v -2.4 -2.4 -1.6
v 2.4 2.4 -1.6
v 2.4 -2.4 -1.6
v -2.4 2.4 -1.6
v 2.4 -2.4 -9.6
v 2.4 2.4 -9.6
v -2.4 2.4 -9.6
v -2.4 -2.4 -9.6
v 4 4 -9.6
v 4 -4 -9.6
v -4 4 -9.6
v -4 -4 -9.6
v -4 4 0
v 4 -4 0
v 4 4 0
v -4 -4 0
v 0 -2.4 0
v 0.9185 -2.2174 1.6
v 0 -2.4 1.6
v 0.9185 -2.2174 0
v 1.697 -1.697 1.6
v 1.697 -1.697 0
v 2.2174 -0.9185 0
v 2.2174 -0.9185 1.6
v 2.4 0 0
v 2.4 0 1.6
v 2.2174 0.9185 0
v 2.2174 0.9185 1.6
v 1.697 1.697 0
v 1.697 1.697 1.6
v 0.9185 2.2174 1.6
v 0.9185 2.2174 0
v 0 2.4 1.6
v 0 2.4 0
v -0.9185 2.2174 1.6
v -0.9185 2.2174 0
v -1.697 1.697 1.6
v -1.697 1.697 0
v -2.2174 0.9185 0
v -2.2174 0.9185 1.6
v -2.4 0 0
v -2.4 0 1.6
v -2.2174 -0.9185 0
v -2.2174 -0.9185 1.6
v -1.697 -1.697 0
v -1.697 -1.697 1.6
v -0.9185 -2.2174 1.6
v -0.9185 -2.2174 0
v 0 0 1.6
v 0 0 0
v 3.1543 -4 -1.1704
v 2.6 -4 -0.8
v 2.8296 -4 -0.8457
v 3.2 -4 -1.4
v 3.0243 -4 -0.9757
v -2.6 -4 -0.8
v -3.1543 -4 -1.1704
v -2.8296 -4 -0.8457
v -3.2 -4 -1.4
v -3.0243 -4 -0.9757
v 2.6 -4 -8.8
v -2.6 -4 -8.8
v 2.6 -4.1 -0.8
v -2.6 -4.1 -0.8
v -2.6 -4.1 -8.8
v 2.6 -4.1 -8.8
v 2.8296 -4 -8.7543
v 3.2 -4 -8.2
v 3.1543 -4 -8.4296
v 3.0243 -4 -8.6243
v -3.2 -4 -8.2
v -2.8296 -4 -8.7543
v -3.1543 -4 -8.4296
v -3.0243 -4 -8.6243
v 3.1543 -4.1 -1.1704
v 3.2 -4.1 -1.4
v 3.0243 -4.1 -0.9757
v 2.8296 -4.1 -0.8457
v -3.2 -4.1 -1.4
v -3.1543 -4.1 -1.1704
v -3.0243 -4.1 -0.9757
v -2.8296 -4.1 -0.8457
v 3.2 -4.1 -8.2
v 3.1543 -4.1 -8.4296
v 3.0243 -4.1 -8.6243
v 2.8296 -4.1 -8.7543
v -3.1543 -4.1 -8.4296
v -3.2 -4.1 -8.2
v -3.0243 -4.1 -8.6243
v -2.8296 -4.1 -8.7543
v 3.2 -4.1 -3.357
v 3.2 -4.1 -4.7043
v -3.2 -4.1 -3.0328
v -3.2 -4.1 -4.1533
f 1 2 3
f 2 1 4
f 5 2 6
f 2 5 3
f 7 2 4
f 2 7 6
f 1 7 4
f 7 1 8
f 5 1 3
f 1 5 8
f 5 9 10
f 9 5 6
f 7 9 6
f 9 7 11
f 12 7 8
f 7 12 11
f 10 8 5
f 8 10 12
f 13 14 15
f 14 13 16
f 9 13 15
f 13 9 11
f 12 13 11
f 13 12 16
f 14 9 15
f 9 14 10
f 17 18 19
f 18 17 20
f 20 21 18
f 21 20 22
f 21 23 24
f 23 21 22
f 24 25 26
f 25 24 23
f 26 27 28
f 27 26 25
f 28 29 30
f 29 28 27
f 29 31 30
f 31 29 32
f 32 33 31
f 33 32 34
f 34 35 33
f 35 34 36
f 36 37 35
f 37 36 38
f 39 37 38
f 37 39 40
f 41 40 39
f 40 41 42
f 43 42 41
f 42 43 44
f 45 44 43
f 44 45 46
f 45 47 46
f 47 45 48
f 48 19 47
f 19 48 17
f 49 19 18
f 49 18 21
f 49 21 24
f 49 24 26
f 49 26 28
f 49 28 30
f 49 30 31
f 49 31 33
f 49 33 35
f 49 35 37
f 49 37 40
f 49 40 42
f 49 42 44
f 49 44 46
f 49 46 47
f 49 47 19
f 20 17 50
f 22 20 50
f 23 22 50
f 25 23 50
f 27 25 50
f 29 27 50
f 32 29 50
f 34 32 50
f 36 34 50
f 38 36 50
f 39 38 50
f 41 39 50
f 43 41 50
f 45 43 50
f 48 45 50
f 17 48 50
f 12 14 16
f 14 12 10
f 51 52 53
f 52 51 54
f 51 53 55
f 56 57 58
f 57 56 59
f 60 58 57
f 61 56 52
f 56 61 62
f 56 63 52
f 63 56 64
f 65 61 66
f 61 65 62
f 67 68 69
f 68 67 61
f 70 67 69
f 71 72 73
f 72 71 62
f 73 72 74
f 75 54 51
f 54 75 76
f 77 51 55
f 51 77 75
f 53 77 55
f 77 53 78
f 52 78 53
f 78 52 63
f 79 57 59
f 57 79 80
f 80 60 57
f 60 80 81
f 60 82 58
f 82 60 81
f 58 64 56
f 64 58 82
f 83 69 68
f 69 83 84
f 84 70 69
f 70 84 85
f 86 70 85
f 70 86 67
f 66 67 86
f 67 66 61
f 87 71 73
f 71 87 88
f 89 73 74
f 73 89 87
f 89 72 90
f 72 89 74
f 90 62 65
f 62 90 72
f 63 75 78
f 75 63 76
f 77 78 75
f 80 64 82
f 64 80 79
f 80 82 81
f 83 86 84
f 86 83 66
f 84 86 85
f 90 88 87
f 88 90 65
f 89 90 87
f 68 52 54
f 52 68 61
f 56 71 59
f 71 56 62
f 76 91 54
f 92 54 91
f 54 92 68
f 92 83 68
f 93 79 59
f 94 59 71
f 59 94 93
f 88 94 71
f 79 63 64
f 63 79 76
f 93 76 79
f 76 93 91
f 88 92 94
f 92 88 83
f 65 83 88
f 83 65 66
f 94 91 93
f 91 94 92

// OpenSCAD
// file: ../p/4-4edge.scad
use <../lib.scad>
function ldraw_lib__4_4edge() = [
// 0 Circle 1.0
// 0 Name: 4-4edge.dat
// 0 Author: James Jessiman
// 0 !LDRAW_ORG Primitive UPDATE 2017-01
// 0 !LICENSE Licensed under CC BY 2.0 and CC BY 4.0 : see CAreadme.txt
// 
// 0 BFC CERTIFY CCW
  [0,"BFC","CERTIFY"],
  [0,"BFC","CCW"],
// 
// 0 !HISTORY 1998-12-15 [PTadmin] Official Update 1998-10
// 0 !HISTORY 2005-12-28 [PTadmin] Official Update 2005-01
// 0 !HISTORY 2007-06-24 [PTadmin] Header formatted for Contributor Agreement
// 0 !HISTORY 2008-07-01 [PTadmin] Official Update 2008-01
// 0 !HISTORY 2017-01-15 [Steffen] BFCed
// 0 !HISTORY 2017-12-30 [PTadmin] Official Update 2017-01
// 
// 
// 2 24 1 0 0 0.9239 0 0.3827
  [2,24,1,0,0,0.9239,0,0.3827],
// 2 24 0.9239 0 0.3827 0.7071 0 0.7071
  [2,24,0.9239,0,0.3827,0.7071,0,0.7071],
// 2 24 0.7071 0 0.7071 0.3827 0 0.9239
  [2,24,0.7071,0,0.7071,0.3827,0,0.9239],
// 2 24 0.3827 0 0.9239 0 0 1
  [2,24,0.3827,0,0.9239,0,0,1],
// 2 24 0 0 1 -0.3827 0 0.9239
  [2,24,0,0,1,-0.3827,0,0.9239],
// 2 24 -0.3827 0 0.9239 -0.7071 0 0.7071
  [2,24,-0.3827,0,0.9239,-0.7071,0,0.7071],
// 2 24 -0.7071 0 0.7071 -0.9239 0 0.3827
  [2,24,-0.7071,0,0.7071,-0.9239,0,0.3827],
// 2 24 -0.9239 0 0.3827 -1 0 -0
  [2,24,-0.9239,0,0.3827,-1,0,-0],
// 2 24 -1 0 -0 -0.9239 0 -0.3827
  [2,24,-1,0,-0,-0.9239,0,-0.3827],
// 2 24 -0.9239 0 -0.3827 -0.7071 0 -0.7071
  [2,24,-0.9239,0,-0.3827,-0.7071,0,-0.7071],
// 2 24 -0.7071 0 -0.7071 -0.3827 0 -0.9239
  [2,24,-0.7071,0,-0.7071,-0.3827,0,-0.9239],
// 2 24 -0.3827 0 -0.9239 0 0 -1
  [2,24,-0.3827,0,-0.9239,0,0,-1],
// 2 24 0 0 -1 0.3827 0 -0.9239
  [2,24,0,0,-1,0.3827,0,-0.9239],
// 2 24 0.3827 0 -0.9239 0.7071 0 -0.7071
  [2,24,0.3827,0,-0.9239,0.7071,0,-0.7071],
// 2 24 0.7071 0 -0.7071 0.9239 0 -0.3827
  [2,24,0.7071,0,-0.7071,0.9239,0,-0.3827],
// 2 24 0.9239 0 -0.3827 1 0 0
  [2,24,0.9239,0,-0.3827,1,0,0],
];
module ldraw_lib__4_4edge(step=0, col=false, unit=2/5, alt=false, line=0.2, solid=!$preview)
    makepoly(ldraw_lib__4_4edge(), step=step, col=col, unit=unit, alt=alt, line=line, solid=solid);
ldraw_lib__4_4edge(line=0.2);
// file: ../p/4-4disc.scad
use <../lib.scad>
function ldraw_lib__4_4disc() = [
// 0 Disc 1.0
// 0 Name: 4-4disc.dat
// 0 Author: James Jessiman
// 0 !LDRAW_ORG Primitive UPDATE 2002-02
// 0 !LICENSE Licensed under CC BY 2.0 and CC BY 4.0 : see CAreadme.txt
// 
// 0 BFC CERTIFY CCW
  [0,"BFC","CERTIFY"],
  [0,"BFC","CCW"],
// 
// 0 !HISTORY 1998-12-15 [PTadmin] Official Update 1998-10
// 0 !HISTORY 2002-03-23 [sbliss] Added BFC statement
// 0 !HISTORY 2002-04-25 [PTadmin] Official Update 2002-02
// 0 !HISTORY 2007-06-24 [PTadmin] Header formatted for Contributor Agreement
// 0 !HISTORY 2008-07-01 [PTadmin] Official Update 2008-01
// 
// 
// 3 16 0 0 0 1 0 0 0.9239 0 0.3827
  [3,16,0,0,0,1,0,0,0.9239,0,0.3827],
// 3 16 0 0 0 0.9239 0 0.3827 0.7071 0 0.7071
  [3,16,0,0,0,0.9239,0,0.3827,0.7071,0,0.7071],
// 3 16 0 0 0 0.7071 0 0.7071 0.3827 0 0.9239
  [3,16,0,0,0,0.7071,0,0.7071,0.3827,0,0.9239],
// 3 16 0 0 0 0.3827 0 0.9239 0 0 1
  [3,16,0,0,0,0.3827,0,0.9239,0,0,1],
// 3 16 0 0 0 0 0 1 -0.3827 0 0.9239
  [3,16,0,0,0,0,0,1,-0.3827,0,0.9239],
// 3 16 0 0 0 -0.3827 0 0.9239 -0.7071 0 0.7071
  [3,16,0,0,0,-0.3827,0,0.9239,-0.7071,0,0.7071],
// 3 16 0 0 0 -0.7071 0 0.7071 -0.9239 0 0.3827
  [3,16,0,0,0,-0.7071,0,0.7071,-0.9239,0,0.3827],
// 3 16 0 0 0 -0.9239 0 0.3827 -1 0 -0
  [3,16,0,0,0,-0.9239,0,0.3827,-1,0,-0],
// 3 16 0 0 0 -1 0 -0 -0.9239 0 -0.3827
  [3,16,0,0,0,-1,0,-0,-0.9239,0,-0.3827],
// 3 16 0 0 0 -0.9239 0 -0.3827 -0.7071 0 -0.7071
  [3,16,0,0,0,-0.9239,0,-0.3827,-0.7071,0,-0.7071],
// 3 16 0 0 0 -0.7071 0 -0.7071 -0.3827 0 -0.9239
  [3,16,0,0,0,-0.7071,0,-0.7071,-0.3827,0,-0.9239],
// 3 16 0 0 0 -0.3827 0 -0.9239 0 0 -1
  [3,16,0,0,0,-0.3827,0,-0.9239,0,0,-1],
// 3 16 0 0 0 0 0 -1 0.3827 0 -0.9239
  [3,16,0,0,0,0,0,-1,0.3827,0,-0.9239],
// 3 16 0 0 0 0.3827 0 -0.9239 0.7071 0 -0.7071
  [3,16,0,0,0,0.3827,0,-0.9239,0.7071,0,-0.7071],
// 3 16 0 0 0 0.7071 0 -0.7071 0.9239 0 -0.3827
  [3,16,0,0,0,0.7071,0,-0.7071,0.9239,0,-0.3827],
// 3 16 0 0 0 0.9239 0 -0.3827 1 0 0
  [3,16,0,0,0,0.9239,0,-0.3827,1,0,0],
// 0
];
module ldraw_lib__4_4disc(step=0, col=false, unit=2/5, alt=false, line=0.2, solid=!$preview)
    makepoly(ldraw_lib__4_4disc(), step=step, col=col, unit=unit, alt=alt, line=line, solid=solid);
ldraw_lib__4_4disc(line=0.2);
// file: ../p/4-4cyli.scad
use <../lib.scad>
$fa=1; $fs=0.2;
function ldraw_lib__4_4cyli(realsolid=false) = [
// 0 Cylinder 1.0
// 0 Name: 4-4cyli.dat
// 0 Author: James Jessiman
// 0 !LDRAW_ORG Primitive UPDATE 2005-01
// 0 !LICENSE Licensed under CC BY 2.0 and CC BY 4.0 : see CAreadme.txt
// 
// 0 BFC CERTIFY CCW
  [0,"BFC","CERTIFY"],
  [0,"BFC","CCW"],
// 
// 0 !HISTORY 1998-12-15 [PTadmin] Official Update 1998-10
// 0 !HISTORY 2002-03-23 [sbliss] Added BFC statement; merged headers from files in distributions LDraw 0.27 and Complete.
// 0 !HISTORY 2002-04-25 [PTadmin] Official Update 2002-02
// 0 !HISTORY 2004-12-14 [guyvivan] BFC CCW
// 0 !HISTORY 2005-12-28 [PTadmin] Official Update 2005-01
// 0 !HISTORY 2007-06-24 [PTadmin] Header formatted for Contributor Agreement
// 0 !HISTORY 2008-07-01 [PTadmin] Official Update 2008-01
// 
// 
// 4 16 1 1 0 0.9239 1 0.3827 0.9239 0 0.3827 1 0 0
  [4,16,1,1,0,0.9239,1,0.3827,0.9239,0,0.3827,1,0,0],
// 5 24 1 0 0 1 1 0 0.9239 0 0.3827 0.9239 0 -0.3827
  [5,24,1,0,0,1,1,0,0.9239,0,0.3827,0.9239,0,-0.3827],
// 4 16 0.9239 1 0.3827 0.7071 1 0.7071 0.7071 0 0.7071 0.9239 0 0.3827
  [4,16,0.9239,1,0.3827,0.7071,1,0.7071,0.7071,0,0.7071,0.9239,0,0.3827],
// 5 24 0.9239 0 0.3827 0.9239 1 0.3827 0.7071 0 0.7071 1 0 0
  [5,24,0.9239,0,0.3827,0.9239,1,0.3827,0.7071,0,0.7071,1,0,0],
// 4 16 0.7071 1 0.7071 0.3827 1 0.9239 0.3827 0 0.9239 0.7071 0 0.7071
  [4,16,0.7071,1,0.7071,0.3827,1,0.9239,0.3827,0,0.9239,0.7071,0,0.7071],
// 5 24 0.7071 0 0.7071 0.7071 1 0.7071 0.3827 0 0.9239 0.9239 0 0.3827
  [5,24,0.7071,0,0.7071,0.7071,1,0.7071,0.3827,0,0.9239,0.9239,0,0.3827],
// 4 16 0.3827 1 0.9239 0 1 1 0 0 1 0.3827 0 0.9239
  [4,16,0.3827,1,0.9239,0,1,1,0,0,1,0.3827,0,0.9239],
// 5 24 0.3827 0 0.9239 0.3827 1 0.9239 0 0 1 0.7071 0 0.7071
  [5,24,0.3827,0,0.9239,0.3827,1,0.9239,0,0,1,0.7071,0,0.7071],
// 4 16 0 1 1 -0.3827 1 0.9239 -0.3827 0 0.9239 0 0 1
  [4,16,0,1,1,-0.3827,1,0.9239,-0.3827,0,0.9239,0,0,1],
// 5 24 0 0 1 0 1 1 -0.3827 0 0.9239 0.3827 0 0.9239
  [5,24,0,0,1,0,1,1,-0.3827,0,0.9239,0.3827,0,0.9239],
// 4 16 -0.3827 1 0.9239 -0.7071 1 0.7071 -0.7071 0 0.7071 -0.3827 0 0.9239
  [4,16,-0.3827,1,0.9239,-0.7071,1,0.7071,-0.7071,0,0.7071,-0.3827,0,0.9239],
// 5 24 -0.3827 0 0.9239 -0.3827 1 0.9239 -0.7071 0 0.7071 0 0 1
  [5,24,-0.3827,0,0.9239,-0.3827,1,0.9239,-0.7071,0,0.7071,0,0,1],
// 4 16 -0.7071 1 0.7071 -0.9239 1 0.3827 -0.9239 0 0.3827 -0.7071 0 0.7071
  [4,16,-0.7071,1,0.7071,-0.9239,1,0.3827,-0.9239,0,0.3827,-0.7071,0,0.7071],
// 5 24 -0.7071 0 0.7071 -0.7071 1 0.7071 -0.9239 0 0.3827 -0.3827 0 0.9239
  [5,24,-0.7071,0,0.7071,-0.7071,1,0.7071,-0.9239,0,0.3827,-0.3827,0,0.9239],
// 4 16 -0.9239 1 0.3827 -1 1 0 -1 0 0 -0.9239 0 0.3827
  [4,16,-0.9239,1,0.3827,-1,1,0,-1,0,0,-0.9239,0,0.3827],
// 5 24 -0.9239 0 0.3827 -0.9239 1 0.3827 -1 0 0 -0.7071 0 0.7071
  [5,24,-0.9239,0,0.3827,-0.9239,1,0.3827,-1,0,0,-0.7071,0,0.7071],
// 4 16 -1 1 0 -0.9239 1 -0.3827 -0.9239 0 -0.3827 -1 0 0
  [4,16,-1,1,0,-0.9239,1,-0.3827,-0.9239,0,-0.3827,-1,0,0],
// 5 24 -1 0 0 -1 1 0 -0.9239 0 -0.3827 -0.9239 0 0.3827
  [5,24,-1,0,0,-1,1,0,-0.9239,0,-0.3827,-0.9239,0,0.3827],
// 4 16 -0.9239 1 -0.3827 -0.7071 1 -0.7071 -0.7071 0 -0.7071 -0.9239 0 -0.3827
  [4,16,-0.9239,1,-0.3827,-0.7071,1,-0.7071,-0.7071,0,-0.7071,-0.9239,0,-0.3827],
// 5 24 -0.9239 0 -0.3827 -0.9239 1 -0.3827 -0.7071 0 -0.7071 -1 0 0
  [5,24,-0.9239,0,-0.3827,-0.9239,1,-0.3827,-0.7071,0,-0.7071,-1,0,0],
// 4 16 -0.7071 1 -0.7071 -0.3827 1 -0.9239 -0.3827 0 -0.9239 -0.7071 0 -0.7071
  [4,16,-0.7071,1,-0.7071,-0.3827,1,-0.9239,-0.3827,0,-0.9239,-0.7071,0,-0.7071],
// 5 24 -0.7071 0 -0.7071 -0.7071 1 -0.7071 -0.3827 0 -0.9239 -0.9239 0 -0.3827
  [5,24,-0.7071,0,-0.7071,-0.7071,1,-0.7071,-0.3827,0,-0.9239,-0.9239,0,-0.3827],
// 4 16 -0.3827 1 -0.9239 0 1 -1 0 0 -1 -0.3827 0 -0.9239
  [4,16,-0.3827,1,-0.9239,0,1,-1,0,0,-1,-0.3827,0,-0.9239],
// 5 24 -0.3827 0 -0.9239 -0.3827 1 -0.9239 0 0 -1 -0.7071 0 -0.7071
  [5,24,-0.3827,0,-0.9239,-0.3827,1,-0.9239,0,0,-1,-0.7071,0,-0.7071],
// 4 16 0 1 -1 0.3827 1 -0.9239 0.3827 0 -0.9239 0 0 -1
  [4,16,0,1,-1,0.3827,1,-0.9239,0.3827,0,-0.9239,0,0,-1],
// 5 24 0 0 -1 0 1 -1 0.3827 0 -0.9239 -0.3827 0 -0.9239
  [5,24,0,0,-1,0,1,-1,0.3827,0,-0.9239,-0.3827,0,-0.9239],
// 4 16 0.3827 1 -0.9239 0.7071 1 -0.7071 0.7071 0 -0.7071 0.3827 0 -0.9239
  [4,16,0.3827,1,-0.9239,0.7071,1,-0.7071,0.7071,0,-0.7071,0.3827,0,-0.9239],
// 5 24 0.3827 0 -0.9239 0.3827 1 -0.9239 0.7071 0 -0.7071 0 0 -1
  [5,24,0.3827,0,-0.9239,0.3827,1,-0.9239,0.7071,0,-0.7071,0,0,-1],
// 4 16 0.7071 1 -0.7071 0.9239 1 -0.3827 0.9239 0 -0.3827 0.7071 0 -0.7071
  [4,16,0.7071,1,-0.7071,0.9239,1,-0.3827,0.9239,0,-0.3827,0.7071,0,-0.7071],
// 5 24 0.7071 0 -0.7071 0.7071 1 -0.7071 0.9239 0 -0.3827 0.3827 0 -0.9239
  [5,24,0.7071,0,-0.7071,0.7071,1,-0.7071,0.9239,0,-0.3827,0.3827,0,-0.9239],
// 4 16 0.9239 1 -0.3827 1 1 0 1 0 0 0.9239 0 -0.3827
  [4,16,0.9239,1,-0.3827,1,1,0,1,0,0,0.9239,0,-0.3827],
// 5 24 0.9239 0 -0.3827 0.9239 1 -0.3827 1 0 0 0.7071 0 -0.7071
  [5,24,0.9239,0,-0.3827,0.9239,1,-0.3827,1,0,0,0.7071,0,-0.7071],
// 0
];
module ldraw_lib__4_4cyli(step=0, col=false, unit=2/5, alt=false, line=0.2, solid=!$preview)
    makepoly(ldraw_lib__4_4cyli(solid), step=step, col=col, unit=unit, alt=alt, line=line, solid=solid);
ldraw_lib__4_4cyli(line=0.2);
// file: ../p/box3u12.scad
use <../lib.scad>
function ldraw_lib__box3u12() = [
// 0 Box with 3 Parallel Faces without Any Edges
// 0 Name: box3u12.dat
// 0 Author: J.C. Tchang [tchang]
// 0 !LDRAW_ORG Primitive UPDATE 2014-02
// 0 !LICENSE Licensed under CC BY 2.0 and CC BY 4.0 : see CAreadme.txt
// 
// 0 BFC CERTIFY CCW
  [0,"BFC","CERTIFY"],
  [0,"BFC","CCW"],
// 
// 0 !HISTORY 2014-12-23 [PTadmin] Official Update 2014-02
// 
// 
// 4 16 -1 1 1 1 1 1 1 1 -1 -1 1 -1
  [4,16,-1,1,1,1,1,1,1,1,-1,-1,1,-1],
// 4 16 -1 1 1 -1 0 1 1 0 1 1 1 1
  [4,16,-1,1,1,-1,0,1,1,0,1,1,1,1],
// 4 16 1 1 -1 1 0 -1 -1 0 -1 -1 1 -1
  [4,16,1,1,-1,1,0,-1,-1,0,-1,-1,1,-1],
];
makepoly(ldraw_lib__box3u12(), line=0.2);
// file: ../p/1-4cyli.scad
use <../lib.scad>
function ldraw_lib__1_4cyli() = [
// 0 Cylinder 0.25
// 0 Name: 1-4cyli.dat
// 0 Author: James Jessiman
// 0 !LDRAW_ORG Primitive UPDATE 2012-01
// 0 !LICENSE Licensed under CC BY 2.0 and CC BY 4.0 : see CAreadme.txt
// 
// 0 BFC CERTIFY CCW
  [0,"BFC","CERTIFY"],
  [0,"BFC","CCW"],
// 
// 0 !HISTORY 2002-03-23 [sbliss] Added BFC statement.
// 0 !HISTORY 2002-04-25 [PTadmin] Official Update 2002-02
// 0 !HISTORY 2007-06-22 [PTadmin] Header formatted for Contributor Agreement
// 0 !HISTORY 2008-07-01 [PTadmin] Official Update 2008-01
// 0 !HISTORY 2012-02-16 [Philo] Changed to CCW
// 0 !HISTORY 2012-03-30 [PTadmin] Official Update 2012-01
// 
// 
// 4 16 1 1 0 0.9239 1 0.3827 0.9239 0 0.3827 1 0 0
  [4,16,1,1,0,0.9239,1,0.3827,0.9239,0,0.3827,1,0,0],
// 5 24 1 0 0 1 1 0 0.9239 0 0.3827 1 0 -1
  [5,24,1,0,0,1,1,0,0.9239,0,0.3827,1,0,-1],
// 4 16 0.9239 1 0.3827 0.7071 1 0.7071 0.7071 0 0.7071 0.9239 0 0.3827
  [4,16,0.9239,1,0.3827,0.7071,1,0.7071,0.7071,0,0.7071,0.9239,0,0.3827],
// 5 24 0.9239 0 0.3827 0.9239 1 0.3827 0.7071 0 0.7071 1 0 0
  [5,24,0.9239,0,0.3827,0.9239,1,0.3827,0.7071,0,0.7071,1,0,0],
// 4 16 0.7071 1 0.7071 0.3827 1 0.9239 0.3827 0 0.9239 0.7071 0 0.7071
  [4,16,0.7071,1,0.7071,0.3827,1,0.9239,0.3827,0,0.9239,0.7071,0,0.7071],
// 5 24 0.7071 0 0.7071 0.7071 1 0.7071 0.3827 0 0.9239 0.9239 0 0.3827
  [5,24,0.7071,0,0.7071,0.7071,1,0.7071,0.3827,0,0.9239,0.9239,0,0.3827],
// 4 16 0.3827 1 0.9239 0 1 1 0 0 1 0.3827 0 0.9239
  [4,16,0.3827,1,0.9239,0,1,1,0,0,1,0.3827,0,0.9239],
// 5 24 0.3827 0 0.9239 0.3827 1 0.9239 0 0 1 0.7071 0 0.7071
  [5,24,0.3827,0,0.9239,0.3827,1,0.9239,0,0,1,0.7071,0,0.7071],
// 5 24 0 0 1 0 1 1 0.3827 0 0.9239 -1 0 1
  [5,24,0,0,1,0,1,1,0.3827,0,0.9239,-1,0,1],
];
module ldraw_lib__1_4cyli(step=0, col=false, unit=2/5, alt=false, line=0.2, solid=!$preview)
    makepoly(ldraw_lib__1_4cyli(), step=step, col=col, unit=unit, alt=alt, line=line, solid=solid);
ldraw_lib__1_4cyli(line=0.2);
// file: ../p/1-4chrd.scad
use <../lib.scad>
$fa=1; $fs=0.2;
function ldraw_lib__1_4chrd(realsolid=false) = [
// 0 Chord 0.25
// 0 Name: 1-4chrd.dat
// 0 Author: Tony Hafner [hafhead]
// 0 !LDRAW_ORG Primitive UPDATE 2012-02
// 0 !LICENSE Licensed under CC BY 2.0 and CC BY 4.0 : see CAreadme.txt
// 
// 0 BFC CERTIFY CCW
  [0,"BFC","CERTIFY"],
  [0,"BFC","CCW"],
// 
// 0 !HISTORY 2004-04-22 [PTadmin] Official Update 2004-02
// 0 !HISTORY 2007-10-09 [PTadmin] Header formatted for Contributor Agreement
// 0 !HISTORY 2008-07-01 [PTadmin] Official Update 2008-01
// 0 !HISTORY 2012-08-02 [MMR1988] Re-creation with PrimGen2 and Rectifier
// 0 !HISTORY 2012-08-09 [PTadmin] Official Update 2012-02
// 
// 
// 4 16 0.9239 0 0.3827 0.3827 0 0.9239 0 0 1 1 0 0
  [4,16,0.9239,0,0.3827,0.3827,0,0.9239,0,0,1,1,0,0],
// 3 16 0.7071 0 0.7071 0.3827 0 0.9239 0.9239 0 0.3827
  [3,16,0.7071,0,0.7071,0.3827,0,0.9239,0.9239,0,0.3827],
];
module ldraw_lib__1_4chrd(step=0, col=false, unit=2/5, alt=false, line=0.2, solid=!$preview)
    makepoly(ldraw_lib__1_4chrd(solid), step=step, col=col, unit=unit, alt=alt, line=line, solid=solid);
ldraw_lib__1_4chrd(line=0.2);
// file: ../p/stud.scad
use <../lib.scad>
use <4-4cyli.scad>
use <4-4disc.scad>
use <4-4edge.scad>
function ldraw_lib__stud() = [
// 0 Stud
// 0 Name: stud.dat
// 0 Author: James Jessiman
// 0 !LDRAW_ORG Primitive UPDATE 2012-01
// 0 !LICENSE Licensed under CC BY 4.0 : see CAreadme.txt
// 
// 0 BFC CERTIFY CCW
  [0,"BFC","CERTIFY"],
  [0,"BFC","CCW"],
// 
// 0 !HISTORY 2002-04-04 [sbliss] Modified for BFC compliance
// 0 !HISTORY 2002-04-25 [PTadmin] Official Update 2002-02
// 0 !HISTORY 2007-06-24 [PTadmin] Header formatted for Contributor Agreement
// 0 !HISTORY 2008-07-01 [PTadmin] Official Update 2008-01
// 0 !HISTORY 2012-02-16 [Philo] Changed to CCW
// 0 !HISTORY 2012-03-30 [PTadmin] Official Update 2012-01
// 
// 
// 1 16 0 0 0 6 0 0 0 1 0 0 0 6 4-4edge.dat
  [1,16,0,0,0,6,0,0,0,1,0,0,0,6, ldraw_lib__4_4edge()],
// 1 16 0 -4 0 6 0 0 0 1 0 0 0 6 4-4edge.dat
  [1,16,0,-4,0,6,0,0,0,1,0,0,0,6, ldraw_lib__4_4edge()],
// 1 16 0 0 0 6 0 0 0 -4 0 0 0 6 4-4cyli.dat
  [1,16,0,0,0,6,0,0,0,-4,0,0,0,6, ldraw_lib__4_4cyli()],
// 1 16 0 -4 0 6 0 0 0 1 0 0 0 6 4-4disc.dat
  [1,16,0,-4,0,6,0,0,0,1,0,0,0,6, ldraw_lib__4_4disc()],
  [-1,16,0,0,0,6,0,0,0,-1,0,0,0,6, ldraw_lib__4_4disc()],
];
module ldraw_lib__stud(step=0, col=false, unit=2/5, alt=false, line=0.2, solid=!$preview)
    makepoly(ldraw_lib__stud(), step=step, col=col, unit=unit, alt=alt, line=line, solid=solid);
ldraw_lib__stud(line=0.2);
// file: ../p/box5.scad
use <../lib.scad>
function ldraw_lib__box5() = [
// 0 Box with 5 Faces and All Edges
// 0 Name: box5.dat
// 0 Author: James Jessiman
// 0 !LDRAW_ORG Primitive UPDATE 2012-01
// 0 !LICENSE Licensed under CC BY 2.0 and CC BY 4.0 : see CAreadme.txt
// 
// 0 BFC CERTIFY CCW
  [0,"BFC","CERTIFY"],
  [0,"BFC","CCW"],
// 
// 0 !HISTORY 2002-04-03 [sbliss] Modified for BFC compliance
// 0 !HISTORY 2002-04-25 [PTadmin] Official Update 2002-02
// 0 !HISTORY 2007-06-24 [PTadmin] Header formatted for Contributor Agreement
// 0 !HISTORY 2008-07-01 [PTadmin] Official Update 2008-01
// 0 !HISTORY 2012-02-16 [Philo] Changed to CCW
// 0 !HISTORY 2012-03-30 [PTadmin] Official Update 2012-01
// 
// 
// 2 24 1 1 1 -1 1 1
  [2,24,1,1,1,-1,1,1],
// 2 24 -1 1 1 -1 1 -1
  [2,24,-1,1,1,-1,1,-1],
// 2 24 -1 1 -1 1 1 -1
  [2,24,-1,1,-1,1,1,-1],
// 2 24 1 1 -1 1 1 1
  [2,24,1,1,-1,1,1,1],
// 2 24 1 0 1 -1 0 1
  [2,24,1,0,1,-1,0,1],
// 2 24 -1 0 1 -1 0 -1
  [2,24,-1,0,1,-1,0,-1],
// 2 24 -1 0 -1 1 0 -1
  [2,24,-1,0,-1,1,0,-1],
// 2 24 1 0 -1 1 0 1
  [2,24,1,0,-1,1,0,1],
// 2 24 1 0 1 1 1 1
  [2,24,1,0,1,1,1,1],
// 2 24 -1 0 1 -1 1 1
  [2,24,-1,0,1,-1,1,1],
// 2 24 1 0 -1 1 1 -1
  [2,24,1,0,-1,1,1,-1],
// 2 24 -1 0 -1 -1 1 -1
  [2,24,-1,0,-1,-1,1,-1],
// 4 16 -1 1 1 1 1 1 1 1 -1 -1 1 -1
  [4,16,-1,1,1,1,1,1,1,1,-1,-1,1,-1],
// 4 16 -1 1 1 -1 0 1 1 0 1 1 1 1
  [4,16,-1,1,1,-1,0,1,1,0,1,1,1,1],
// 4 16 -1 1 -1 -1 0 -1 -1 0 1 -1 1 1
  [4,16,-1,1,-1,-1,0,-1,-1,0,1,-1,1,1],
// 4 16 1 1 -1 1 0 -1 -1 0 -1 -1 1 -1
  [4,16,1,1,-1,1,0,-1,-1,0,-1,-1,1,-1],
// 4 16 1 1 1 1 0 1 1 0 -1 1 1 -1
  [4,16,1,1,1,1,0,1,1,0,-1,1,1,-1],
];
makepoly(ldraw_lib__box5(), line=0.2);
// file: ../p/box4t.scad
use <../lib.scad>
function ldraw_lib__box4t() = [
// 0 Box with 4 Adjacent Faces and All Edges
// 0 Name: box4t.dat
// 0 Author: Tore Eriksson [Tore_Eriksson]
// 0 !LDRAW_ORG Primitive UPDATE 2003-02
// 0 !LICENSE Licensed under CC BY 2.0 and CC BY 4.0 : see CAreadme.txt
// 
// 0 BFC CERTIFY CCW
  [0,"BFC","CERTIFY"],
  [0,"BFC","CCW"],
// 
// 0 !HISTORY 1997-09-29 [PTadmin] Official Update 1997-15
// 0 !HISTORY 2002-08-31 [izanette] Modified with WINDZ for BFC compliance
// 0 !HISTORY 2003-08-01 [PTadmin] Official Update 2003-02
// 0 !HISTORY 2007-06-24 [PTadmin] Header formatted for Contributor Agreement
// 0 !HISTORY 2008-07-01 [PTadmin] Official Update 2008-01
// 
// 
// 2 24 1 1 1 -1 1 1
  [2,24,1,1,1,-1,1,1],
// 2 24 -1 1 1 -1 1 -1
  [2,24,-1,1,1,-1,1,-1],
// 2 24 -1 1 -1 1 1 -1
  [2,24,-1,1,-1,1,1,-1],
// 2 24 1 1 -1 1 1 1
  [2,24,1,1,-1,1,1,1],
// 2 24 1 0 1 -1 0 1
  [2,24,1,0,1,-1,0,1],
// 2 24 -1 0 1 -1 0 -1
  [2,24,-1,0,1,-1,0,-1],
// 2 24 -1 0 -1 1 0 -1
  [2,24,-1,0,-1,1,0,-1],
// 2 24 1 0 -1 1 0 1
  [2,24,1,0,-1,1,0,1],
// 2 24 1 0 1 1 1 1
  [2,24,1,0,1,1,1,1],
// 2 24 -1 0 1 -1 1 1
  [2,24,-1,0,1,-1,1,1],
// 2 24 1 0 -1 1 1 -1
  [2,24,1,0,-1,1,1,-1],
// 2 24 -1 0 -1 -1 1 -1
  [2,24,-1,0,-1,-1,1,-1],
// 4 16 1 1 1 1 1 -1 -1 1 -1 -1 1 1
  [4,16,1,1,1,1,1,-1,-1,1,-1,-1,1,1],
// 4 16 1 1 1 -1 1 1 -1 0 1 1 0 1
  [4,16,1,1,1,-1,1,1,-1,0,1,1,0,1],
// 4 16 -1 1 1 -1 1 -1 -1 0 -1 -1 0 1
  [4,16,-1,1,1,-1,1,-1,-1,0,-1,-1,0,1],
// 0 4 16 -1 1 -1 -1 0 -1 1 0 -1 1 1 -1
// 4 16 1 1 -1 1 1 1 1 0 1 1 0 -1
  [4,16,1,1,-1,1,1,1,1,0,1,1,0,-1],
// 0
];
makepoly(ldraw_lib__box4t(), line=0.2);
// file: 6148328z.scad
use <../lib.scad>
use <../p/1-4chrd.scad>
use <../p/1-4cyli.scad>
use <../p/box3u12.scad>
function ldraw_lib__6148328z() = [
// 0 Sticker  1.0 x  0.8 with White Stripe on Red Background Left
// 0 Name: 6148328z.dat
// 0 Author: Massimo Maso [Sirio]
// 0 !LDRAW_ORG Part UPDATE 2024-05
// 0 !LICENSE Licensed under CC BY 4.0 : see CAreadme.txt
// 
// 0 BFC CERTIFY CCW
  [0,"BFC","CERTIFY"],
  [0,"BFC","CCW"],
// 
// 0 !KEYWORDS 917K, Bricklink 75876stk01, Brickowl 852010, Pit Lane, Porsche
// 0 !KEYWORDS Rebrickable 26357, set 75876, Speed Champions
// 
// 0 !HISTORY 2024-06-30 [OrionP] Official Update 2024-05
// 
// 
// 0 // Primitives
// 
// 1 16 -6.5 0 8.5 -1.5 0 0 0 -1 0 0 0 1.5 1-4chrd.dat
  [1,16,-6.5,0,8.5,-1.5,0,0,0,-1,0,0,0,1.5, ldraw_lib__1_4chrd()],
// 1 16 6.5 0 8.5 1.5 0 0 0 -1 0 0 0 1.5 1-4chrd.dat
  [1,16,6.5,0,8.5,1.5,0,0,0,-1,0,0,0,1.5, ldraw_lib__1_4chrd()],
// 1 16 0 -.25 0 6.5 0 0 0 .25 0 0 0 10 box3u12.dat
  [1,16,0,-.25,0,6.5,0,0,0,.25,0,0,0,10, ldraw_lib__box3u12()],
// 1 16 -6.5 0 -8.5 -1.5 0 0 0 -1 0 0 0 -1.5 1-4chrd.dat
  [1,16,-6.5,0,-8.5,-1.5,0,0,0,-1,0,0,0,-1.5, ldraw_lib__1_4chrd()],
// 1 16 6.5 0 -8.5 1.5 0 0 0 -1 0 0 0 -1.5 1-4chrd.dat
  [1,16,6.5,0,-8.5,1.5,0,0,0,-1,0,0,0,-1.5, ldraw_lib__1_4chrd()],
// 1 16 -6.5 0 8.5 -1.5 0 0 0 -.25 0 0 0 1.5 1-4cyli.dat
  [1,16,-6.5,0,8.5,-1.5,0,0,0,-.25,0,0,0,1.5, ldraw_lib__1_4cyli()],
// 1 16 6.5 0 8.5 1.5 0 0 0 -.25 0 0 0 1.5 1-4cyli.dat
  [1,16,6.5,0,8.5,1.5,0,0,0,-.25,0,0,0,1.5, ldraw_lib__1_4cyli()],
// 1 16 -6.5 0 -8.5 -1.5 0 0 0 -.25 0 0 0 -1.5 1-4cyli.dat
  [1,16,-6.5,0,-8.5,-1.5,0,0,0,-.25,0,0,0,-1.5, ldraw_lib__1_4cyli()],
// 1 16 6.5 0 -8.5 1.5 0 0 0 -.25 0 0 0 -1.5 1-4cyli.dat
  [1,16,6.5,0,-8.5,1.5,0,0,0,-.25,0,0,0,-1.5, ldraw_lib__1_4cyli()],
// 1 4 -6.5 -.25 8.5 -1.5 0 0 0 1 0 0 0 1.5 1-4chrd.dat
  [1,4,-6.5,-.25,8.5,-1.5,0,0,0,1,0,0,0,1.5, ldraw_lib__1_4chrd()],
// 1 4 6.5 -.25 8.5 1.5 0 0 0 1 0 0 0 1.5 1-4chrd.dat
  [1,4,6.5,-.25,8.5,1.5,0,0,0,1,0,0,0,1.5, ldraw_lib__1_4chrd()],
// 1 4 -6.5 -.25 -8.5 -1.5 0 0 0 1 0 0 0 -1.5 1-4chrd.dat
  [1,4,-6.5,-.25,-8.5,-1.5,0,0,0,1,0,0,0,-1.5, ldraw_lib__1_4chrd()],
// 1 4 6.5 -.25 -8.5 1.5 0 0 0 1 0 0 0 -1.5 1-4chrd.dat
  [1,4,6.5,-.25,-8.5,1.5,0,0,0,1,0,0,0,-1.5, ldraw_lib__1_4chrd()],
// 0 // Bottom faces
// 4 16 -6.5 0 10 -6.5 0 -10 -8 0 -8.5 -8 0 8.5
  [4,16,-6.5,0,10,-6.5,0,-10,-8,0,-8.5,-8,0,8.5],
// 4 16 6.5 0 10 8 0 8.5 8 0 -8.5 6.5 0 -10
  [4,16,6.5,0,10,8,0,8.5,8,0,-8.5,6.5,0,-10],
// 0 // Lateral faces
// 3 16 -8 0 8.5 -8 -.25 3.6076 -8 -.25 8.5
  [3,16,-8,0,8.5,-8,-.25,3.6076,-8,-.25,8.5],
// 4 16 -8 0 8.5 -8 0 -8.5 -8 -.25 .2392 -8 -.25 3.6076
  [4,16,-8,0,8.5,-8,0,-8.5,-8,-.25,.2392,-8,-.25,3.6076],
// 3 16 -8 0 -8.5 -8 -.25 -8.5 -8 -.25 .2392
  [3,16,-8,0,-8.5,-8,-.25,-8.5,-8,-.25,.2392],
// 3 16 8 0 8.5 8 -.25 8.5 8 -.25 4.4179
  [3,16,8,0,8.5,8,-.25,8.5,8,-.25,4.4179],
// 4 16 8 0 8.5 8 -.25 4.4179 8 -.25 1.6167 8 0 -8.5
  [4,16,8,0,8.5,8,-.25,4.4179,8,-.25,1.6167,8,0,-8.5],
// 3 16 8 0 -8.5 8 -.25 1.6167 8 -.25 -8.5
  [3,16,8,0,-8.5,8,-.25,1.6167,8,-.25,-8.5],
// 0 // Top faces
// 0 // Red faces
// 4 4 -8 -.25 8.5 8 -.25 8.5 6.5 -.25 10 -6.5 -.25 10
  [4,4,-8,-.25,8.5,8,-.25,8.5,6.5,-.25,10,-6.5,-.25,10],
// 4 4 -8 -.25 8.5 -8 -.25 3.6076 8 -.25 4.4179 8 -.25 8.5
  [4,4,-8,-.25,8.5,-8,-.25,3.6076,8,-.25,4.4179,8,-.25,8.5],
// 4 4 -8 -.25 -8.5 8 -.25 -8.5 8 -.25 1.6167 -8 -.25 .2392
  [4,4,-8,-.25,-8.5,8,-.25,-8.5,8,-.25,1.6167,-8,-.25,.2392],
// 4 4 -8 -.25 -8.5 -6.5 -.25 -10 6.5 -.25 -10 8 -.25 -8.5
  [4,4,-8,-.25,-8.5,-6.5,-.25,-10,6.5,-.25,-10,8,-.25,-8.5],
// 0 // White face
// 4 15 -8 -.25 3.6076 -8 -.25 .2392 8 -.25 1.6167 8 -.25 4.4179
  [4,15,-8,-.25,3.6076,-8,-.25,.2392,8,-.25,1.6167,8,-.25,4.4179],
];
module ldraw_lib__6148328z(step=0, col=false, unit=2/5, alt=false, line=0.2, solid=!$preview)
    makepoly(ldraw_lib__6148328z(), step=step, col=col, unit=unit, alt=alt, line=line, solid=solid);
ldraw_lib__6148328z(line=0.2);
// file: s/3005s01.scad
use <../../lib.scad>
use <../../p/box4t.scad>
use <../../p/box5.scad>
use <../../p/stud.scad>
function ldraw_lib__s__3005s01() = [
// 0 ~Brick  1 x  1 without Front Face
// 0 Name: s\3005s01.dat
// 0 Author: John Riley [jriley]
// 0 !LDRAW_ORG Subpart UPDATE 2004-01
// 0 !LICENSE Licensed under CC BY 2.0 and CC BY 4.0 : see CAreadme.txt
// 
// 0 BFC CERTIFY CCW
  [0,"BFC","CERTIFY"],
  [0,"BFC","CCW"],
// 
// 0 !HISTORY 2003-09-07 [jriley] BFCed & Subfiled
// 0 !HISTORY 2004-03-02 [PTadmin] Official Update 2004-01
// 0 !HISTORY 2007-08-29 [PTadmin] Header formatted for Contributor Agreement
// 0 !HISTORY 2008-07-01 [PTadmin] Official Update 2008-01
// 
// 
// 0 BFC INVERTNEXT
  [0,"BFC","INVERTNEXT"],
// 1 16 0 24 0 0 0 6 0 -20 0 -6 0 0 box5.dat
  [1,16,0,24,0,0,0,6,0,-20,0,-6,0,0, ldraw_lib__box5()],
// 4 16 10 24 -10 6 24 -6 6 24 6 10 24 10
  [4,16,10,24,-10,6,24,-6,6,24,6,10,24,10],
// 4 16 10 24 10 6 24 6 -6 24 6 -10 24 10
  [4,16,10,24,10,6,24,6,-6,24,6,-10,24,10],
// 4 16 -10 24 10 -6 24 6 -6 24 -6 -10 24 -10
  [4,16,-10,24,10,-6,24,6,-6,24,-6,-10,24,-10],
// 4 16 -10 24 -10 -6 24 -6 6 24 -6 10 24 -10
  [4,16,-10,24,-10,-6,24,-6,6,24,-6,10,24,-10],
// 1 16 0 24 0 10 0 0 0 -24 0 0 0 10 box4t.dat
  [1,16,0,24,0,10,0,0,0,-24,0,0,0,10, ldraw_lib__box4t()],
// 1 16 0 0 0 0 0 1 0 1 0 -1 0 0 stud.dat
  [1,16,0,0,0,0,0,1,0,1,0,-1,0,0, ldraw_lib__stud()],
// 0
];
module ldraw_lib__s__3005s01(step=0, col=false, unit=2/5, alt=false, line=0.2, solid=!$preview)
    makepoly(ldraw_lib__s__3005s01(), step=step, col=col, unit=unit, alt=alt, line=line, solid=solid);
ldraw_lib__s__3005s01(line=0.2);
// file: 6148328ai.scad
use <../lib.scad>
use <6148328z.scad>
function ldraw_lib__6148328ai() = [
// 0 Sticker  1.0 x  0.8 with White Stripe on Red Background Right
// 0 Name: 6148328ai.dat
// 0 Author: Massimo Maso [Sirio]
// 0 !LDRAW_ORG Part UPDATE 2024-05
// 0 !LICENSE Licensed under CC BY 4.0 : see CAreadme.txt
// 
// 0 BFC CERTIFY CCW
  [0,"BFC","CERTIFY"],
  [0,"BFC","CCW"],
// 
// 0 !KEYWORDS 917K, Bricklink 75876stk01, Brickowl 852010, Pit Lane, Porsche
// 0 !KEYWORDS Rebrickable 26357, set 75876, Speed Champions
// 
// 0 !HISTORY 2024-06-30 [OrionP] Official Update 2024-05
// 
// 
// 1 16 0 0 0 -1 0 0 0 1 0 0 0 1 6148328z.dat
  [1,16,0,0,0,-1,0,0,0,1,0,0,0,1, ldraw_lib__6148328z()],
];
module ldraw_lib__6148328ai(step=0, col=false, unit=2/5, alt=false, line=0.2, solid=!$preview)
    makepoly(ldraw_lib__6148328ai(), step=step, col=col, unit=unit, alt=alt, line=line, solid=solid);
ldraw_lib__6148328ai(line=0.2);
// file: 3005.scad
use <../lib.scad>
use <s/3005s01.scad>
function ldraw_lib__3005() = [
// 0 Brick  1 x  1
// 0 Name: 3005.dat
// 0 Author: James Jessiman
// 0 !LDRAW_ORG Part UPDATE 2022-05
// 0 !LICENSE Licensed under CC BY 2.0 and CC BY 4.0 : see CAreadme.txt
// 
// 0 BFC CERTIFY CCW
  [0,"BFC","CERTIFY"],
  [0,"BFC","CCW"],
// 
// 0 !HISTORY 2001-10-26 [PTadmin] Official Update 2001-01
// 0 !HISTORY 2002-05-07 {unknown} BFC Certification
// 0 !HISTORY 2002-06-11 [PTadmin] Official Update 2002-03
// 0 !HISTORY 2007-05-07 [PTadmin] Header formatted for Contributor Agreement
// 0 !HISTORY 2008-07-01 [PTadmin] Official Update 2008-01
// 0 !HISTORY 2022-08-04 [MagFors] Using subfile
// 0 !HISTORY 2022-09-15 [PTadmin] Official Update 2022-05
// 
// 
// 1 16 0 0 0 1 0 0 0 1 0 0 0 1 s\3005s01.dat
  [1,16,0,0,0,1,0,0,0,1,0,0,0,1, ldraw_lib__s__3005s01()],
// 4 16 -10 24 -10 10 24 -10 10 0 -10 -10 0 -10
  [4,16,-10,24,-10,10,24,-10,10,0,-10,-10,0,-10],
];
module ldraw_lib__3005(step=0, col=false, unit=2/5, alt=false, line=0.2, solid=!$preview)
    makepoly(ldraw_lib__3005(), step=step, col=col, unit=unit, alt=alt, line=line, solid=solid);
ldraw_lib__3005(line=0.2);
// main file
use <../lib.scad>
use <3005.scad>
use <6148328ai.scad>
function ldraw_lib__3005d0e() = [
// 0 Brick  1 x  1 with White Stripe on Red Background Right Sticker
// 0 Name: 3005d0e.dat
// 0 Author: Vincent Messenet [Cheenzo]
// 0 !LDRAW_ORG Shortcut UPDATE 2026-05
// 0 !LICENSE Licensed under CC BY 4.0 : see CAreadme.txt
// 
// 0 BFC CERTIFY CCW
  [0,"BFC","CERTIFY"],
  [0,"BFC","CCW"],
// 
// 0 !CATEGORY Sticker Shortcut
// 
// 0 !KEYWORDS Bricklink 3005pb034L, Porsche 919 Hybrid and 917K Pit Lane
// 0 !KEYWORDS set 75876, Speed Champions
// 
// 0 !HISTORY 2026-05-31 [OrionP] Official Update 2026-05
// 
// 1 16 0 0 0 1 0 0 0 1 0 0 0 1 3005.dat
  [1,16,0,0,0,1,0,0,0,1,0,0,0,1, ldraw_lib__3005()],
// 1 16 0 12 -10 1 0 0 0 0 -1 0 1 0 6148328ai.dat
  [1,16,0,12,-10,1,0,0,0,0,-1,0,1,0, ldraw_lib__6148328ai()],
];
module ldraw_lib__3005d0e(step=0, col=false, unit=2/5, alt=false, line=0.2, solid=!$preview)
    makepoly(ldraw_lib__3005d0e(), step=step, col=col, unit=unit, alt=alt, line=line, solid=solid);
ldraw_lib__3005d0e(line=0.2);
